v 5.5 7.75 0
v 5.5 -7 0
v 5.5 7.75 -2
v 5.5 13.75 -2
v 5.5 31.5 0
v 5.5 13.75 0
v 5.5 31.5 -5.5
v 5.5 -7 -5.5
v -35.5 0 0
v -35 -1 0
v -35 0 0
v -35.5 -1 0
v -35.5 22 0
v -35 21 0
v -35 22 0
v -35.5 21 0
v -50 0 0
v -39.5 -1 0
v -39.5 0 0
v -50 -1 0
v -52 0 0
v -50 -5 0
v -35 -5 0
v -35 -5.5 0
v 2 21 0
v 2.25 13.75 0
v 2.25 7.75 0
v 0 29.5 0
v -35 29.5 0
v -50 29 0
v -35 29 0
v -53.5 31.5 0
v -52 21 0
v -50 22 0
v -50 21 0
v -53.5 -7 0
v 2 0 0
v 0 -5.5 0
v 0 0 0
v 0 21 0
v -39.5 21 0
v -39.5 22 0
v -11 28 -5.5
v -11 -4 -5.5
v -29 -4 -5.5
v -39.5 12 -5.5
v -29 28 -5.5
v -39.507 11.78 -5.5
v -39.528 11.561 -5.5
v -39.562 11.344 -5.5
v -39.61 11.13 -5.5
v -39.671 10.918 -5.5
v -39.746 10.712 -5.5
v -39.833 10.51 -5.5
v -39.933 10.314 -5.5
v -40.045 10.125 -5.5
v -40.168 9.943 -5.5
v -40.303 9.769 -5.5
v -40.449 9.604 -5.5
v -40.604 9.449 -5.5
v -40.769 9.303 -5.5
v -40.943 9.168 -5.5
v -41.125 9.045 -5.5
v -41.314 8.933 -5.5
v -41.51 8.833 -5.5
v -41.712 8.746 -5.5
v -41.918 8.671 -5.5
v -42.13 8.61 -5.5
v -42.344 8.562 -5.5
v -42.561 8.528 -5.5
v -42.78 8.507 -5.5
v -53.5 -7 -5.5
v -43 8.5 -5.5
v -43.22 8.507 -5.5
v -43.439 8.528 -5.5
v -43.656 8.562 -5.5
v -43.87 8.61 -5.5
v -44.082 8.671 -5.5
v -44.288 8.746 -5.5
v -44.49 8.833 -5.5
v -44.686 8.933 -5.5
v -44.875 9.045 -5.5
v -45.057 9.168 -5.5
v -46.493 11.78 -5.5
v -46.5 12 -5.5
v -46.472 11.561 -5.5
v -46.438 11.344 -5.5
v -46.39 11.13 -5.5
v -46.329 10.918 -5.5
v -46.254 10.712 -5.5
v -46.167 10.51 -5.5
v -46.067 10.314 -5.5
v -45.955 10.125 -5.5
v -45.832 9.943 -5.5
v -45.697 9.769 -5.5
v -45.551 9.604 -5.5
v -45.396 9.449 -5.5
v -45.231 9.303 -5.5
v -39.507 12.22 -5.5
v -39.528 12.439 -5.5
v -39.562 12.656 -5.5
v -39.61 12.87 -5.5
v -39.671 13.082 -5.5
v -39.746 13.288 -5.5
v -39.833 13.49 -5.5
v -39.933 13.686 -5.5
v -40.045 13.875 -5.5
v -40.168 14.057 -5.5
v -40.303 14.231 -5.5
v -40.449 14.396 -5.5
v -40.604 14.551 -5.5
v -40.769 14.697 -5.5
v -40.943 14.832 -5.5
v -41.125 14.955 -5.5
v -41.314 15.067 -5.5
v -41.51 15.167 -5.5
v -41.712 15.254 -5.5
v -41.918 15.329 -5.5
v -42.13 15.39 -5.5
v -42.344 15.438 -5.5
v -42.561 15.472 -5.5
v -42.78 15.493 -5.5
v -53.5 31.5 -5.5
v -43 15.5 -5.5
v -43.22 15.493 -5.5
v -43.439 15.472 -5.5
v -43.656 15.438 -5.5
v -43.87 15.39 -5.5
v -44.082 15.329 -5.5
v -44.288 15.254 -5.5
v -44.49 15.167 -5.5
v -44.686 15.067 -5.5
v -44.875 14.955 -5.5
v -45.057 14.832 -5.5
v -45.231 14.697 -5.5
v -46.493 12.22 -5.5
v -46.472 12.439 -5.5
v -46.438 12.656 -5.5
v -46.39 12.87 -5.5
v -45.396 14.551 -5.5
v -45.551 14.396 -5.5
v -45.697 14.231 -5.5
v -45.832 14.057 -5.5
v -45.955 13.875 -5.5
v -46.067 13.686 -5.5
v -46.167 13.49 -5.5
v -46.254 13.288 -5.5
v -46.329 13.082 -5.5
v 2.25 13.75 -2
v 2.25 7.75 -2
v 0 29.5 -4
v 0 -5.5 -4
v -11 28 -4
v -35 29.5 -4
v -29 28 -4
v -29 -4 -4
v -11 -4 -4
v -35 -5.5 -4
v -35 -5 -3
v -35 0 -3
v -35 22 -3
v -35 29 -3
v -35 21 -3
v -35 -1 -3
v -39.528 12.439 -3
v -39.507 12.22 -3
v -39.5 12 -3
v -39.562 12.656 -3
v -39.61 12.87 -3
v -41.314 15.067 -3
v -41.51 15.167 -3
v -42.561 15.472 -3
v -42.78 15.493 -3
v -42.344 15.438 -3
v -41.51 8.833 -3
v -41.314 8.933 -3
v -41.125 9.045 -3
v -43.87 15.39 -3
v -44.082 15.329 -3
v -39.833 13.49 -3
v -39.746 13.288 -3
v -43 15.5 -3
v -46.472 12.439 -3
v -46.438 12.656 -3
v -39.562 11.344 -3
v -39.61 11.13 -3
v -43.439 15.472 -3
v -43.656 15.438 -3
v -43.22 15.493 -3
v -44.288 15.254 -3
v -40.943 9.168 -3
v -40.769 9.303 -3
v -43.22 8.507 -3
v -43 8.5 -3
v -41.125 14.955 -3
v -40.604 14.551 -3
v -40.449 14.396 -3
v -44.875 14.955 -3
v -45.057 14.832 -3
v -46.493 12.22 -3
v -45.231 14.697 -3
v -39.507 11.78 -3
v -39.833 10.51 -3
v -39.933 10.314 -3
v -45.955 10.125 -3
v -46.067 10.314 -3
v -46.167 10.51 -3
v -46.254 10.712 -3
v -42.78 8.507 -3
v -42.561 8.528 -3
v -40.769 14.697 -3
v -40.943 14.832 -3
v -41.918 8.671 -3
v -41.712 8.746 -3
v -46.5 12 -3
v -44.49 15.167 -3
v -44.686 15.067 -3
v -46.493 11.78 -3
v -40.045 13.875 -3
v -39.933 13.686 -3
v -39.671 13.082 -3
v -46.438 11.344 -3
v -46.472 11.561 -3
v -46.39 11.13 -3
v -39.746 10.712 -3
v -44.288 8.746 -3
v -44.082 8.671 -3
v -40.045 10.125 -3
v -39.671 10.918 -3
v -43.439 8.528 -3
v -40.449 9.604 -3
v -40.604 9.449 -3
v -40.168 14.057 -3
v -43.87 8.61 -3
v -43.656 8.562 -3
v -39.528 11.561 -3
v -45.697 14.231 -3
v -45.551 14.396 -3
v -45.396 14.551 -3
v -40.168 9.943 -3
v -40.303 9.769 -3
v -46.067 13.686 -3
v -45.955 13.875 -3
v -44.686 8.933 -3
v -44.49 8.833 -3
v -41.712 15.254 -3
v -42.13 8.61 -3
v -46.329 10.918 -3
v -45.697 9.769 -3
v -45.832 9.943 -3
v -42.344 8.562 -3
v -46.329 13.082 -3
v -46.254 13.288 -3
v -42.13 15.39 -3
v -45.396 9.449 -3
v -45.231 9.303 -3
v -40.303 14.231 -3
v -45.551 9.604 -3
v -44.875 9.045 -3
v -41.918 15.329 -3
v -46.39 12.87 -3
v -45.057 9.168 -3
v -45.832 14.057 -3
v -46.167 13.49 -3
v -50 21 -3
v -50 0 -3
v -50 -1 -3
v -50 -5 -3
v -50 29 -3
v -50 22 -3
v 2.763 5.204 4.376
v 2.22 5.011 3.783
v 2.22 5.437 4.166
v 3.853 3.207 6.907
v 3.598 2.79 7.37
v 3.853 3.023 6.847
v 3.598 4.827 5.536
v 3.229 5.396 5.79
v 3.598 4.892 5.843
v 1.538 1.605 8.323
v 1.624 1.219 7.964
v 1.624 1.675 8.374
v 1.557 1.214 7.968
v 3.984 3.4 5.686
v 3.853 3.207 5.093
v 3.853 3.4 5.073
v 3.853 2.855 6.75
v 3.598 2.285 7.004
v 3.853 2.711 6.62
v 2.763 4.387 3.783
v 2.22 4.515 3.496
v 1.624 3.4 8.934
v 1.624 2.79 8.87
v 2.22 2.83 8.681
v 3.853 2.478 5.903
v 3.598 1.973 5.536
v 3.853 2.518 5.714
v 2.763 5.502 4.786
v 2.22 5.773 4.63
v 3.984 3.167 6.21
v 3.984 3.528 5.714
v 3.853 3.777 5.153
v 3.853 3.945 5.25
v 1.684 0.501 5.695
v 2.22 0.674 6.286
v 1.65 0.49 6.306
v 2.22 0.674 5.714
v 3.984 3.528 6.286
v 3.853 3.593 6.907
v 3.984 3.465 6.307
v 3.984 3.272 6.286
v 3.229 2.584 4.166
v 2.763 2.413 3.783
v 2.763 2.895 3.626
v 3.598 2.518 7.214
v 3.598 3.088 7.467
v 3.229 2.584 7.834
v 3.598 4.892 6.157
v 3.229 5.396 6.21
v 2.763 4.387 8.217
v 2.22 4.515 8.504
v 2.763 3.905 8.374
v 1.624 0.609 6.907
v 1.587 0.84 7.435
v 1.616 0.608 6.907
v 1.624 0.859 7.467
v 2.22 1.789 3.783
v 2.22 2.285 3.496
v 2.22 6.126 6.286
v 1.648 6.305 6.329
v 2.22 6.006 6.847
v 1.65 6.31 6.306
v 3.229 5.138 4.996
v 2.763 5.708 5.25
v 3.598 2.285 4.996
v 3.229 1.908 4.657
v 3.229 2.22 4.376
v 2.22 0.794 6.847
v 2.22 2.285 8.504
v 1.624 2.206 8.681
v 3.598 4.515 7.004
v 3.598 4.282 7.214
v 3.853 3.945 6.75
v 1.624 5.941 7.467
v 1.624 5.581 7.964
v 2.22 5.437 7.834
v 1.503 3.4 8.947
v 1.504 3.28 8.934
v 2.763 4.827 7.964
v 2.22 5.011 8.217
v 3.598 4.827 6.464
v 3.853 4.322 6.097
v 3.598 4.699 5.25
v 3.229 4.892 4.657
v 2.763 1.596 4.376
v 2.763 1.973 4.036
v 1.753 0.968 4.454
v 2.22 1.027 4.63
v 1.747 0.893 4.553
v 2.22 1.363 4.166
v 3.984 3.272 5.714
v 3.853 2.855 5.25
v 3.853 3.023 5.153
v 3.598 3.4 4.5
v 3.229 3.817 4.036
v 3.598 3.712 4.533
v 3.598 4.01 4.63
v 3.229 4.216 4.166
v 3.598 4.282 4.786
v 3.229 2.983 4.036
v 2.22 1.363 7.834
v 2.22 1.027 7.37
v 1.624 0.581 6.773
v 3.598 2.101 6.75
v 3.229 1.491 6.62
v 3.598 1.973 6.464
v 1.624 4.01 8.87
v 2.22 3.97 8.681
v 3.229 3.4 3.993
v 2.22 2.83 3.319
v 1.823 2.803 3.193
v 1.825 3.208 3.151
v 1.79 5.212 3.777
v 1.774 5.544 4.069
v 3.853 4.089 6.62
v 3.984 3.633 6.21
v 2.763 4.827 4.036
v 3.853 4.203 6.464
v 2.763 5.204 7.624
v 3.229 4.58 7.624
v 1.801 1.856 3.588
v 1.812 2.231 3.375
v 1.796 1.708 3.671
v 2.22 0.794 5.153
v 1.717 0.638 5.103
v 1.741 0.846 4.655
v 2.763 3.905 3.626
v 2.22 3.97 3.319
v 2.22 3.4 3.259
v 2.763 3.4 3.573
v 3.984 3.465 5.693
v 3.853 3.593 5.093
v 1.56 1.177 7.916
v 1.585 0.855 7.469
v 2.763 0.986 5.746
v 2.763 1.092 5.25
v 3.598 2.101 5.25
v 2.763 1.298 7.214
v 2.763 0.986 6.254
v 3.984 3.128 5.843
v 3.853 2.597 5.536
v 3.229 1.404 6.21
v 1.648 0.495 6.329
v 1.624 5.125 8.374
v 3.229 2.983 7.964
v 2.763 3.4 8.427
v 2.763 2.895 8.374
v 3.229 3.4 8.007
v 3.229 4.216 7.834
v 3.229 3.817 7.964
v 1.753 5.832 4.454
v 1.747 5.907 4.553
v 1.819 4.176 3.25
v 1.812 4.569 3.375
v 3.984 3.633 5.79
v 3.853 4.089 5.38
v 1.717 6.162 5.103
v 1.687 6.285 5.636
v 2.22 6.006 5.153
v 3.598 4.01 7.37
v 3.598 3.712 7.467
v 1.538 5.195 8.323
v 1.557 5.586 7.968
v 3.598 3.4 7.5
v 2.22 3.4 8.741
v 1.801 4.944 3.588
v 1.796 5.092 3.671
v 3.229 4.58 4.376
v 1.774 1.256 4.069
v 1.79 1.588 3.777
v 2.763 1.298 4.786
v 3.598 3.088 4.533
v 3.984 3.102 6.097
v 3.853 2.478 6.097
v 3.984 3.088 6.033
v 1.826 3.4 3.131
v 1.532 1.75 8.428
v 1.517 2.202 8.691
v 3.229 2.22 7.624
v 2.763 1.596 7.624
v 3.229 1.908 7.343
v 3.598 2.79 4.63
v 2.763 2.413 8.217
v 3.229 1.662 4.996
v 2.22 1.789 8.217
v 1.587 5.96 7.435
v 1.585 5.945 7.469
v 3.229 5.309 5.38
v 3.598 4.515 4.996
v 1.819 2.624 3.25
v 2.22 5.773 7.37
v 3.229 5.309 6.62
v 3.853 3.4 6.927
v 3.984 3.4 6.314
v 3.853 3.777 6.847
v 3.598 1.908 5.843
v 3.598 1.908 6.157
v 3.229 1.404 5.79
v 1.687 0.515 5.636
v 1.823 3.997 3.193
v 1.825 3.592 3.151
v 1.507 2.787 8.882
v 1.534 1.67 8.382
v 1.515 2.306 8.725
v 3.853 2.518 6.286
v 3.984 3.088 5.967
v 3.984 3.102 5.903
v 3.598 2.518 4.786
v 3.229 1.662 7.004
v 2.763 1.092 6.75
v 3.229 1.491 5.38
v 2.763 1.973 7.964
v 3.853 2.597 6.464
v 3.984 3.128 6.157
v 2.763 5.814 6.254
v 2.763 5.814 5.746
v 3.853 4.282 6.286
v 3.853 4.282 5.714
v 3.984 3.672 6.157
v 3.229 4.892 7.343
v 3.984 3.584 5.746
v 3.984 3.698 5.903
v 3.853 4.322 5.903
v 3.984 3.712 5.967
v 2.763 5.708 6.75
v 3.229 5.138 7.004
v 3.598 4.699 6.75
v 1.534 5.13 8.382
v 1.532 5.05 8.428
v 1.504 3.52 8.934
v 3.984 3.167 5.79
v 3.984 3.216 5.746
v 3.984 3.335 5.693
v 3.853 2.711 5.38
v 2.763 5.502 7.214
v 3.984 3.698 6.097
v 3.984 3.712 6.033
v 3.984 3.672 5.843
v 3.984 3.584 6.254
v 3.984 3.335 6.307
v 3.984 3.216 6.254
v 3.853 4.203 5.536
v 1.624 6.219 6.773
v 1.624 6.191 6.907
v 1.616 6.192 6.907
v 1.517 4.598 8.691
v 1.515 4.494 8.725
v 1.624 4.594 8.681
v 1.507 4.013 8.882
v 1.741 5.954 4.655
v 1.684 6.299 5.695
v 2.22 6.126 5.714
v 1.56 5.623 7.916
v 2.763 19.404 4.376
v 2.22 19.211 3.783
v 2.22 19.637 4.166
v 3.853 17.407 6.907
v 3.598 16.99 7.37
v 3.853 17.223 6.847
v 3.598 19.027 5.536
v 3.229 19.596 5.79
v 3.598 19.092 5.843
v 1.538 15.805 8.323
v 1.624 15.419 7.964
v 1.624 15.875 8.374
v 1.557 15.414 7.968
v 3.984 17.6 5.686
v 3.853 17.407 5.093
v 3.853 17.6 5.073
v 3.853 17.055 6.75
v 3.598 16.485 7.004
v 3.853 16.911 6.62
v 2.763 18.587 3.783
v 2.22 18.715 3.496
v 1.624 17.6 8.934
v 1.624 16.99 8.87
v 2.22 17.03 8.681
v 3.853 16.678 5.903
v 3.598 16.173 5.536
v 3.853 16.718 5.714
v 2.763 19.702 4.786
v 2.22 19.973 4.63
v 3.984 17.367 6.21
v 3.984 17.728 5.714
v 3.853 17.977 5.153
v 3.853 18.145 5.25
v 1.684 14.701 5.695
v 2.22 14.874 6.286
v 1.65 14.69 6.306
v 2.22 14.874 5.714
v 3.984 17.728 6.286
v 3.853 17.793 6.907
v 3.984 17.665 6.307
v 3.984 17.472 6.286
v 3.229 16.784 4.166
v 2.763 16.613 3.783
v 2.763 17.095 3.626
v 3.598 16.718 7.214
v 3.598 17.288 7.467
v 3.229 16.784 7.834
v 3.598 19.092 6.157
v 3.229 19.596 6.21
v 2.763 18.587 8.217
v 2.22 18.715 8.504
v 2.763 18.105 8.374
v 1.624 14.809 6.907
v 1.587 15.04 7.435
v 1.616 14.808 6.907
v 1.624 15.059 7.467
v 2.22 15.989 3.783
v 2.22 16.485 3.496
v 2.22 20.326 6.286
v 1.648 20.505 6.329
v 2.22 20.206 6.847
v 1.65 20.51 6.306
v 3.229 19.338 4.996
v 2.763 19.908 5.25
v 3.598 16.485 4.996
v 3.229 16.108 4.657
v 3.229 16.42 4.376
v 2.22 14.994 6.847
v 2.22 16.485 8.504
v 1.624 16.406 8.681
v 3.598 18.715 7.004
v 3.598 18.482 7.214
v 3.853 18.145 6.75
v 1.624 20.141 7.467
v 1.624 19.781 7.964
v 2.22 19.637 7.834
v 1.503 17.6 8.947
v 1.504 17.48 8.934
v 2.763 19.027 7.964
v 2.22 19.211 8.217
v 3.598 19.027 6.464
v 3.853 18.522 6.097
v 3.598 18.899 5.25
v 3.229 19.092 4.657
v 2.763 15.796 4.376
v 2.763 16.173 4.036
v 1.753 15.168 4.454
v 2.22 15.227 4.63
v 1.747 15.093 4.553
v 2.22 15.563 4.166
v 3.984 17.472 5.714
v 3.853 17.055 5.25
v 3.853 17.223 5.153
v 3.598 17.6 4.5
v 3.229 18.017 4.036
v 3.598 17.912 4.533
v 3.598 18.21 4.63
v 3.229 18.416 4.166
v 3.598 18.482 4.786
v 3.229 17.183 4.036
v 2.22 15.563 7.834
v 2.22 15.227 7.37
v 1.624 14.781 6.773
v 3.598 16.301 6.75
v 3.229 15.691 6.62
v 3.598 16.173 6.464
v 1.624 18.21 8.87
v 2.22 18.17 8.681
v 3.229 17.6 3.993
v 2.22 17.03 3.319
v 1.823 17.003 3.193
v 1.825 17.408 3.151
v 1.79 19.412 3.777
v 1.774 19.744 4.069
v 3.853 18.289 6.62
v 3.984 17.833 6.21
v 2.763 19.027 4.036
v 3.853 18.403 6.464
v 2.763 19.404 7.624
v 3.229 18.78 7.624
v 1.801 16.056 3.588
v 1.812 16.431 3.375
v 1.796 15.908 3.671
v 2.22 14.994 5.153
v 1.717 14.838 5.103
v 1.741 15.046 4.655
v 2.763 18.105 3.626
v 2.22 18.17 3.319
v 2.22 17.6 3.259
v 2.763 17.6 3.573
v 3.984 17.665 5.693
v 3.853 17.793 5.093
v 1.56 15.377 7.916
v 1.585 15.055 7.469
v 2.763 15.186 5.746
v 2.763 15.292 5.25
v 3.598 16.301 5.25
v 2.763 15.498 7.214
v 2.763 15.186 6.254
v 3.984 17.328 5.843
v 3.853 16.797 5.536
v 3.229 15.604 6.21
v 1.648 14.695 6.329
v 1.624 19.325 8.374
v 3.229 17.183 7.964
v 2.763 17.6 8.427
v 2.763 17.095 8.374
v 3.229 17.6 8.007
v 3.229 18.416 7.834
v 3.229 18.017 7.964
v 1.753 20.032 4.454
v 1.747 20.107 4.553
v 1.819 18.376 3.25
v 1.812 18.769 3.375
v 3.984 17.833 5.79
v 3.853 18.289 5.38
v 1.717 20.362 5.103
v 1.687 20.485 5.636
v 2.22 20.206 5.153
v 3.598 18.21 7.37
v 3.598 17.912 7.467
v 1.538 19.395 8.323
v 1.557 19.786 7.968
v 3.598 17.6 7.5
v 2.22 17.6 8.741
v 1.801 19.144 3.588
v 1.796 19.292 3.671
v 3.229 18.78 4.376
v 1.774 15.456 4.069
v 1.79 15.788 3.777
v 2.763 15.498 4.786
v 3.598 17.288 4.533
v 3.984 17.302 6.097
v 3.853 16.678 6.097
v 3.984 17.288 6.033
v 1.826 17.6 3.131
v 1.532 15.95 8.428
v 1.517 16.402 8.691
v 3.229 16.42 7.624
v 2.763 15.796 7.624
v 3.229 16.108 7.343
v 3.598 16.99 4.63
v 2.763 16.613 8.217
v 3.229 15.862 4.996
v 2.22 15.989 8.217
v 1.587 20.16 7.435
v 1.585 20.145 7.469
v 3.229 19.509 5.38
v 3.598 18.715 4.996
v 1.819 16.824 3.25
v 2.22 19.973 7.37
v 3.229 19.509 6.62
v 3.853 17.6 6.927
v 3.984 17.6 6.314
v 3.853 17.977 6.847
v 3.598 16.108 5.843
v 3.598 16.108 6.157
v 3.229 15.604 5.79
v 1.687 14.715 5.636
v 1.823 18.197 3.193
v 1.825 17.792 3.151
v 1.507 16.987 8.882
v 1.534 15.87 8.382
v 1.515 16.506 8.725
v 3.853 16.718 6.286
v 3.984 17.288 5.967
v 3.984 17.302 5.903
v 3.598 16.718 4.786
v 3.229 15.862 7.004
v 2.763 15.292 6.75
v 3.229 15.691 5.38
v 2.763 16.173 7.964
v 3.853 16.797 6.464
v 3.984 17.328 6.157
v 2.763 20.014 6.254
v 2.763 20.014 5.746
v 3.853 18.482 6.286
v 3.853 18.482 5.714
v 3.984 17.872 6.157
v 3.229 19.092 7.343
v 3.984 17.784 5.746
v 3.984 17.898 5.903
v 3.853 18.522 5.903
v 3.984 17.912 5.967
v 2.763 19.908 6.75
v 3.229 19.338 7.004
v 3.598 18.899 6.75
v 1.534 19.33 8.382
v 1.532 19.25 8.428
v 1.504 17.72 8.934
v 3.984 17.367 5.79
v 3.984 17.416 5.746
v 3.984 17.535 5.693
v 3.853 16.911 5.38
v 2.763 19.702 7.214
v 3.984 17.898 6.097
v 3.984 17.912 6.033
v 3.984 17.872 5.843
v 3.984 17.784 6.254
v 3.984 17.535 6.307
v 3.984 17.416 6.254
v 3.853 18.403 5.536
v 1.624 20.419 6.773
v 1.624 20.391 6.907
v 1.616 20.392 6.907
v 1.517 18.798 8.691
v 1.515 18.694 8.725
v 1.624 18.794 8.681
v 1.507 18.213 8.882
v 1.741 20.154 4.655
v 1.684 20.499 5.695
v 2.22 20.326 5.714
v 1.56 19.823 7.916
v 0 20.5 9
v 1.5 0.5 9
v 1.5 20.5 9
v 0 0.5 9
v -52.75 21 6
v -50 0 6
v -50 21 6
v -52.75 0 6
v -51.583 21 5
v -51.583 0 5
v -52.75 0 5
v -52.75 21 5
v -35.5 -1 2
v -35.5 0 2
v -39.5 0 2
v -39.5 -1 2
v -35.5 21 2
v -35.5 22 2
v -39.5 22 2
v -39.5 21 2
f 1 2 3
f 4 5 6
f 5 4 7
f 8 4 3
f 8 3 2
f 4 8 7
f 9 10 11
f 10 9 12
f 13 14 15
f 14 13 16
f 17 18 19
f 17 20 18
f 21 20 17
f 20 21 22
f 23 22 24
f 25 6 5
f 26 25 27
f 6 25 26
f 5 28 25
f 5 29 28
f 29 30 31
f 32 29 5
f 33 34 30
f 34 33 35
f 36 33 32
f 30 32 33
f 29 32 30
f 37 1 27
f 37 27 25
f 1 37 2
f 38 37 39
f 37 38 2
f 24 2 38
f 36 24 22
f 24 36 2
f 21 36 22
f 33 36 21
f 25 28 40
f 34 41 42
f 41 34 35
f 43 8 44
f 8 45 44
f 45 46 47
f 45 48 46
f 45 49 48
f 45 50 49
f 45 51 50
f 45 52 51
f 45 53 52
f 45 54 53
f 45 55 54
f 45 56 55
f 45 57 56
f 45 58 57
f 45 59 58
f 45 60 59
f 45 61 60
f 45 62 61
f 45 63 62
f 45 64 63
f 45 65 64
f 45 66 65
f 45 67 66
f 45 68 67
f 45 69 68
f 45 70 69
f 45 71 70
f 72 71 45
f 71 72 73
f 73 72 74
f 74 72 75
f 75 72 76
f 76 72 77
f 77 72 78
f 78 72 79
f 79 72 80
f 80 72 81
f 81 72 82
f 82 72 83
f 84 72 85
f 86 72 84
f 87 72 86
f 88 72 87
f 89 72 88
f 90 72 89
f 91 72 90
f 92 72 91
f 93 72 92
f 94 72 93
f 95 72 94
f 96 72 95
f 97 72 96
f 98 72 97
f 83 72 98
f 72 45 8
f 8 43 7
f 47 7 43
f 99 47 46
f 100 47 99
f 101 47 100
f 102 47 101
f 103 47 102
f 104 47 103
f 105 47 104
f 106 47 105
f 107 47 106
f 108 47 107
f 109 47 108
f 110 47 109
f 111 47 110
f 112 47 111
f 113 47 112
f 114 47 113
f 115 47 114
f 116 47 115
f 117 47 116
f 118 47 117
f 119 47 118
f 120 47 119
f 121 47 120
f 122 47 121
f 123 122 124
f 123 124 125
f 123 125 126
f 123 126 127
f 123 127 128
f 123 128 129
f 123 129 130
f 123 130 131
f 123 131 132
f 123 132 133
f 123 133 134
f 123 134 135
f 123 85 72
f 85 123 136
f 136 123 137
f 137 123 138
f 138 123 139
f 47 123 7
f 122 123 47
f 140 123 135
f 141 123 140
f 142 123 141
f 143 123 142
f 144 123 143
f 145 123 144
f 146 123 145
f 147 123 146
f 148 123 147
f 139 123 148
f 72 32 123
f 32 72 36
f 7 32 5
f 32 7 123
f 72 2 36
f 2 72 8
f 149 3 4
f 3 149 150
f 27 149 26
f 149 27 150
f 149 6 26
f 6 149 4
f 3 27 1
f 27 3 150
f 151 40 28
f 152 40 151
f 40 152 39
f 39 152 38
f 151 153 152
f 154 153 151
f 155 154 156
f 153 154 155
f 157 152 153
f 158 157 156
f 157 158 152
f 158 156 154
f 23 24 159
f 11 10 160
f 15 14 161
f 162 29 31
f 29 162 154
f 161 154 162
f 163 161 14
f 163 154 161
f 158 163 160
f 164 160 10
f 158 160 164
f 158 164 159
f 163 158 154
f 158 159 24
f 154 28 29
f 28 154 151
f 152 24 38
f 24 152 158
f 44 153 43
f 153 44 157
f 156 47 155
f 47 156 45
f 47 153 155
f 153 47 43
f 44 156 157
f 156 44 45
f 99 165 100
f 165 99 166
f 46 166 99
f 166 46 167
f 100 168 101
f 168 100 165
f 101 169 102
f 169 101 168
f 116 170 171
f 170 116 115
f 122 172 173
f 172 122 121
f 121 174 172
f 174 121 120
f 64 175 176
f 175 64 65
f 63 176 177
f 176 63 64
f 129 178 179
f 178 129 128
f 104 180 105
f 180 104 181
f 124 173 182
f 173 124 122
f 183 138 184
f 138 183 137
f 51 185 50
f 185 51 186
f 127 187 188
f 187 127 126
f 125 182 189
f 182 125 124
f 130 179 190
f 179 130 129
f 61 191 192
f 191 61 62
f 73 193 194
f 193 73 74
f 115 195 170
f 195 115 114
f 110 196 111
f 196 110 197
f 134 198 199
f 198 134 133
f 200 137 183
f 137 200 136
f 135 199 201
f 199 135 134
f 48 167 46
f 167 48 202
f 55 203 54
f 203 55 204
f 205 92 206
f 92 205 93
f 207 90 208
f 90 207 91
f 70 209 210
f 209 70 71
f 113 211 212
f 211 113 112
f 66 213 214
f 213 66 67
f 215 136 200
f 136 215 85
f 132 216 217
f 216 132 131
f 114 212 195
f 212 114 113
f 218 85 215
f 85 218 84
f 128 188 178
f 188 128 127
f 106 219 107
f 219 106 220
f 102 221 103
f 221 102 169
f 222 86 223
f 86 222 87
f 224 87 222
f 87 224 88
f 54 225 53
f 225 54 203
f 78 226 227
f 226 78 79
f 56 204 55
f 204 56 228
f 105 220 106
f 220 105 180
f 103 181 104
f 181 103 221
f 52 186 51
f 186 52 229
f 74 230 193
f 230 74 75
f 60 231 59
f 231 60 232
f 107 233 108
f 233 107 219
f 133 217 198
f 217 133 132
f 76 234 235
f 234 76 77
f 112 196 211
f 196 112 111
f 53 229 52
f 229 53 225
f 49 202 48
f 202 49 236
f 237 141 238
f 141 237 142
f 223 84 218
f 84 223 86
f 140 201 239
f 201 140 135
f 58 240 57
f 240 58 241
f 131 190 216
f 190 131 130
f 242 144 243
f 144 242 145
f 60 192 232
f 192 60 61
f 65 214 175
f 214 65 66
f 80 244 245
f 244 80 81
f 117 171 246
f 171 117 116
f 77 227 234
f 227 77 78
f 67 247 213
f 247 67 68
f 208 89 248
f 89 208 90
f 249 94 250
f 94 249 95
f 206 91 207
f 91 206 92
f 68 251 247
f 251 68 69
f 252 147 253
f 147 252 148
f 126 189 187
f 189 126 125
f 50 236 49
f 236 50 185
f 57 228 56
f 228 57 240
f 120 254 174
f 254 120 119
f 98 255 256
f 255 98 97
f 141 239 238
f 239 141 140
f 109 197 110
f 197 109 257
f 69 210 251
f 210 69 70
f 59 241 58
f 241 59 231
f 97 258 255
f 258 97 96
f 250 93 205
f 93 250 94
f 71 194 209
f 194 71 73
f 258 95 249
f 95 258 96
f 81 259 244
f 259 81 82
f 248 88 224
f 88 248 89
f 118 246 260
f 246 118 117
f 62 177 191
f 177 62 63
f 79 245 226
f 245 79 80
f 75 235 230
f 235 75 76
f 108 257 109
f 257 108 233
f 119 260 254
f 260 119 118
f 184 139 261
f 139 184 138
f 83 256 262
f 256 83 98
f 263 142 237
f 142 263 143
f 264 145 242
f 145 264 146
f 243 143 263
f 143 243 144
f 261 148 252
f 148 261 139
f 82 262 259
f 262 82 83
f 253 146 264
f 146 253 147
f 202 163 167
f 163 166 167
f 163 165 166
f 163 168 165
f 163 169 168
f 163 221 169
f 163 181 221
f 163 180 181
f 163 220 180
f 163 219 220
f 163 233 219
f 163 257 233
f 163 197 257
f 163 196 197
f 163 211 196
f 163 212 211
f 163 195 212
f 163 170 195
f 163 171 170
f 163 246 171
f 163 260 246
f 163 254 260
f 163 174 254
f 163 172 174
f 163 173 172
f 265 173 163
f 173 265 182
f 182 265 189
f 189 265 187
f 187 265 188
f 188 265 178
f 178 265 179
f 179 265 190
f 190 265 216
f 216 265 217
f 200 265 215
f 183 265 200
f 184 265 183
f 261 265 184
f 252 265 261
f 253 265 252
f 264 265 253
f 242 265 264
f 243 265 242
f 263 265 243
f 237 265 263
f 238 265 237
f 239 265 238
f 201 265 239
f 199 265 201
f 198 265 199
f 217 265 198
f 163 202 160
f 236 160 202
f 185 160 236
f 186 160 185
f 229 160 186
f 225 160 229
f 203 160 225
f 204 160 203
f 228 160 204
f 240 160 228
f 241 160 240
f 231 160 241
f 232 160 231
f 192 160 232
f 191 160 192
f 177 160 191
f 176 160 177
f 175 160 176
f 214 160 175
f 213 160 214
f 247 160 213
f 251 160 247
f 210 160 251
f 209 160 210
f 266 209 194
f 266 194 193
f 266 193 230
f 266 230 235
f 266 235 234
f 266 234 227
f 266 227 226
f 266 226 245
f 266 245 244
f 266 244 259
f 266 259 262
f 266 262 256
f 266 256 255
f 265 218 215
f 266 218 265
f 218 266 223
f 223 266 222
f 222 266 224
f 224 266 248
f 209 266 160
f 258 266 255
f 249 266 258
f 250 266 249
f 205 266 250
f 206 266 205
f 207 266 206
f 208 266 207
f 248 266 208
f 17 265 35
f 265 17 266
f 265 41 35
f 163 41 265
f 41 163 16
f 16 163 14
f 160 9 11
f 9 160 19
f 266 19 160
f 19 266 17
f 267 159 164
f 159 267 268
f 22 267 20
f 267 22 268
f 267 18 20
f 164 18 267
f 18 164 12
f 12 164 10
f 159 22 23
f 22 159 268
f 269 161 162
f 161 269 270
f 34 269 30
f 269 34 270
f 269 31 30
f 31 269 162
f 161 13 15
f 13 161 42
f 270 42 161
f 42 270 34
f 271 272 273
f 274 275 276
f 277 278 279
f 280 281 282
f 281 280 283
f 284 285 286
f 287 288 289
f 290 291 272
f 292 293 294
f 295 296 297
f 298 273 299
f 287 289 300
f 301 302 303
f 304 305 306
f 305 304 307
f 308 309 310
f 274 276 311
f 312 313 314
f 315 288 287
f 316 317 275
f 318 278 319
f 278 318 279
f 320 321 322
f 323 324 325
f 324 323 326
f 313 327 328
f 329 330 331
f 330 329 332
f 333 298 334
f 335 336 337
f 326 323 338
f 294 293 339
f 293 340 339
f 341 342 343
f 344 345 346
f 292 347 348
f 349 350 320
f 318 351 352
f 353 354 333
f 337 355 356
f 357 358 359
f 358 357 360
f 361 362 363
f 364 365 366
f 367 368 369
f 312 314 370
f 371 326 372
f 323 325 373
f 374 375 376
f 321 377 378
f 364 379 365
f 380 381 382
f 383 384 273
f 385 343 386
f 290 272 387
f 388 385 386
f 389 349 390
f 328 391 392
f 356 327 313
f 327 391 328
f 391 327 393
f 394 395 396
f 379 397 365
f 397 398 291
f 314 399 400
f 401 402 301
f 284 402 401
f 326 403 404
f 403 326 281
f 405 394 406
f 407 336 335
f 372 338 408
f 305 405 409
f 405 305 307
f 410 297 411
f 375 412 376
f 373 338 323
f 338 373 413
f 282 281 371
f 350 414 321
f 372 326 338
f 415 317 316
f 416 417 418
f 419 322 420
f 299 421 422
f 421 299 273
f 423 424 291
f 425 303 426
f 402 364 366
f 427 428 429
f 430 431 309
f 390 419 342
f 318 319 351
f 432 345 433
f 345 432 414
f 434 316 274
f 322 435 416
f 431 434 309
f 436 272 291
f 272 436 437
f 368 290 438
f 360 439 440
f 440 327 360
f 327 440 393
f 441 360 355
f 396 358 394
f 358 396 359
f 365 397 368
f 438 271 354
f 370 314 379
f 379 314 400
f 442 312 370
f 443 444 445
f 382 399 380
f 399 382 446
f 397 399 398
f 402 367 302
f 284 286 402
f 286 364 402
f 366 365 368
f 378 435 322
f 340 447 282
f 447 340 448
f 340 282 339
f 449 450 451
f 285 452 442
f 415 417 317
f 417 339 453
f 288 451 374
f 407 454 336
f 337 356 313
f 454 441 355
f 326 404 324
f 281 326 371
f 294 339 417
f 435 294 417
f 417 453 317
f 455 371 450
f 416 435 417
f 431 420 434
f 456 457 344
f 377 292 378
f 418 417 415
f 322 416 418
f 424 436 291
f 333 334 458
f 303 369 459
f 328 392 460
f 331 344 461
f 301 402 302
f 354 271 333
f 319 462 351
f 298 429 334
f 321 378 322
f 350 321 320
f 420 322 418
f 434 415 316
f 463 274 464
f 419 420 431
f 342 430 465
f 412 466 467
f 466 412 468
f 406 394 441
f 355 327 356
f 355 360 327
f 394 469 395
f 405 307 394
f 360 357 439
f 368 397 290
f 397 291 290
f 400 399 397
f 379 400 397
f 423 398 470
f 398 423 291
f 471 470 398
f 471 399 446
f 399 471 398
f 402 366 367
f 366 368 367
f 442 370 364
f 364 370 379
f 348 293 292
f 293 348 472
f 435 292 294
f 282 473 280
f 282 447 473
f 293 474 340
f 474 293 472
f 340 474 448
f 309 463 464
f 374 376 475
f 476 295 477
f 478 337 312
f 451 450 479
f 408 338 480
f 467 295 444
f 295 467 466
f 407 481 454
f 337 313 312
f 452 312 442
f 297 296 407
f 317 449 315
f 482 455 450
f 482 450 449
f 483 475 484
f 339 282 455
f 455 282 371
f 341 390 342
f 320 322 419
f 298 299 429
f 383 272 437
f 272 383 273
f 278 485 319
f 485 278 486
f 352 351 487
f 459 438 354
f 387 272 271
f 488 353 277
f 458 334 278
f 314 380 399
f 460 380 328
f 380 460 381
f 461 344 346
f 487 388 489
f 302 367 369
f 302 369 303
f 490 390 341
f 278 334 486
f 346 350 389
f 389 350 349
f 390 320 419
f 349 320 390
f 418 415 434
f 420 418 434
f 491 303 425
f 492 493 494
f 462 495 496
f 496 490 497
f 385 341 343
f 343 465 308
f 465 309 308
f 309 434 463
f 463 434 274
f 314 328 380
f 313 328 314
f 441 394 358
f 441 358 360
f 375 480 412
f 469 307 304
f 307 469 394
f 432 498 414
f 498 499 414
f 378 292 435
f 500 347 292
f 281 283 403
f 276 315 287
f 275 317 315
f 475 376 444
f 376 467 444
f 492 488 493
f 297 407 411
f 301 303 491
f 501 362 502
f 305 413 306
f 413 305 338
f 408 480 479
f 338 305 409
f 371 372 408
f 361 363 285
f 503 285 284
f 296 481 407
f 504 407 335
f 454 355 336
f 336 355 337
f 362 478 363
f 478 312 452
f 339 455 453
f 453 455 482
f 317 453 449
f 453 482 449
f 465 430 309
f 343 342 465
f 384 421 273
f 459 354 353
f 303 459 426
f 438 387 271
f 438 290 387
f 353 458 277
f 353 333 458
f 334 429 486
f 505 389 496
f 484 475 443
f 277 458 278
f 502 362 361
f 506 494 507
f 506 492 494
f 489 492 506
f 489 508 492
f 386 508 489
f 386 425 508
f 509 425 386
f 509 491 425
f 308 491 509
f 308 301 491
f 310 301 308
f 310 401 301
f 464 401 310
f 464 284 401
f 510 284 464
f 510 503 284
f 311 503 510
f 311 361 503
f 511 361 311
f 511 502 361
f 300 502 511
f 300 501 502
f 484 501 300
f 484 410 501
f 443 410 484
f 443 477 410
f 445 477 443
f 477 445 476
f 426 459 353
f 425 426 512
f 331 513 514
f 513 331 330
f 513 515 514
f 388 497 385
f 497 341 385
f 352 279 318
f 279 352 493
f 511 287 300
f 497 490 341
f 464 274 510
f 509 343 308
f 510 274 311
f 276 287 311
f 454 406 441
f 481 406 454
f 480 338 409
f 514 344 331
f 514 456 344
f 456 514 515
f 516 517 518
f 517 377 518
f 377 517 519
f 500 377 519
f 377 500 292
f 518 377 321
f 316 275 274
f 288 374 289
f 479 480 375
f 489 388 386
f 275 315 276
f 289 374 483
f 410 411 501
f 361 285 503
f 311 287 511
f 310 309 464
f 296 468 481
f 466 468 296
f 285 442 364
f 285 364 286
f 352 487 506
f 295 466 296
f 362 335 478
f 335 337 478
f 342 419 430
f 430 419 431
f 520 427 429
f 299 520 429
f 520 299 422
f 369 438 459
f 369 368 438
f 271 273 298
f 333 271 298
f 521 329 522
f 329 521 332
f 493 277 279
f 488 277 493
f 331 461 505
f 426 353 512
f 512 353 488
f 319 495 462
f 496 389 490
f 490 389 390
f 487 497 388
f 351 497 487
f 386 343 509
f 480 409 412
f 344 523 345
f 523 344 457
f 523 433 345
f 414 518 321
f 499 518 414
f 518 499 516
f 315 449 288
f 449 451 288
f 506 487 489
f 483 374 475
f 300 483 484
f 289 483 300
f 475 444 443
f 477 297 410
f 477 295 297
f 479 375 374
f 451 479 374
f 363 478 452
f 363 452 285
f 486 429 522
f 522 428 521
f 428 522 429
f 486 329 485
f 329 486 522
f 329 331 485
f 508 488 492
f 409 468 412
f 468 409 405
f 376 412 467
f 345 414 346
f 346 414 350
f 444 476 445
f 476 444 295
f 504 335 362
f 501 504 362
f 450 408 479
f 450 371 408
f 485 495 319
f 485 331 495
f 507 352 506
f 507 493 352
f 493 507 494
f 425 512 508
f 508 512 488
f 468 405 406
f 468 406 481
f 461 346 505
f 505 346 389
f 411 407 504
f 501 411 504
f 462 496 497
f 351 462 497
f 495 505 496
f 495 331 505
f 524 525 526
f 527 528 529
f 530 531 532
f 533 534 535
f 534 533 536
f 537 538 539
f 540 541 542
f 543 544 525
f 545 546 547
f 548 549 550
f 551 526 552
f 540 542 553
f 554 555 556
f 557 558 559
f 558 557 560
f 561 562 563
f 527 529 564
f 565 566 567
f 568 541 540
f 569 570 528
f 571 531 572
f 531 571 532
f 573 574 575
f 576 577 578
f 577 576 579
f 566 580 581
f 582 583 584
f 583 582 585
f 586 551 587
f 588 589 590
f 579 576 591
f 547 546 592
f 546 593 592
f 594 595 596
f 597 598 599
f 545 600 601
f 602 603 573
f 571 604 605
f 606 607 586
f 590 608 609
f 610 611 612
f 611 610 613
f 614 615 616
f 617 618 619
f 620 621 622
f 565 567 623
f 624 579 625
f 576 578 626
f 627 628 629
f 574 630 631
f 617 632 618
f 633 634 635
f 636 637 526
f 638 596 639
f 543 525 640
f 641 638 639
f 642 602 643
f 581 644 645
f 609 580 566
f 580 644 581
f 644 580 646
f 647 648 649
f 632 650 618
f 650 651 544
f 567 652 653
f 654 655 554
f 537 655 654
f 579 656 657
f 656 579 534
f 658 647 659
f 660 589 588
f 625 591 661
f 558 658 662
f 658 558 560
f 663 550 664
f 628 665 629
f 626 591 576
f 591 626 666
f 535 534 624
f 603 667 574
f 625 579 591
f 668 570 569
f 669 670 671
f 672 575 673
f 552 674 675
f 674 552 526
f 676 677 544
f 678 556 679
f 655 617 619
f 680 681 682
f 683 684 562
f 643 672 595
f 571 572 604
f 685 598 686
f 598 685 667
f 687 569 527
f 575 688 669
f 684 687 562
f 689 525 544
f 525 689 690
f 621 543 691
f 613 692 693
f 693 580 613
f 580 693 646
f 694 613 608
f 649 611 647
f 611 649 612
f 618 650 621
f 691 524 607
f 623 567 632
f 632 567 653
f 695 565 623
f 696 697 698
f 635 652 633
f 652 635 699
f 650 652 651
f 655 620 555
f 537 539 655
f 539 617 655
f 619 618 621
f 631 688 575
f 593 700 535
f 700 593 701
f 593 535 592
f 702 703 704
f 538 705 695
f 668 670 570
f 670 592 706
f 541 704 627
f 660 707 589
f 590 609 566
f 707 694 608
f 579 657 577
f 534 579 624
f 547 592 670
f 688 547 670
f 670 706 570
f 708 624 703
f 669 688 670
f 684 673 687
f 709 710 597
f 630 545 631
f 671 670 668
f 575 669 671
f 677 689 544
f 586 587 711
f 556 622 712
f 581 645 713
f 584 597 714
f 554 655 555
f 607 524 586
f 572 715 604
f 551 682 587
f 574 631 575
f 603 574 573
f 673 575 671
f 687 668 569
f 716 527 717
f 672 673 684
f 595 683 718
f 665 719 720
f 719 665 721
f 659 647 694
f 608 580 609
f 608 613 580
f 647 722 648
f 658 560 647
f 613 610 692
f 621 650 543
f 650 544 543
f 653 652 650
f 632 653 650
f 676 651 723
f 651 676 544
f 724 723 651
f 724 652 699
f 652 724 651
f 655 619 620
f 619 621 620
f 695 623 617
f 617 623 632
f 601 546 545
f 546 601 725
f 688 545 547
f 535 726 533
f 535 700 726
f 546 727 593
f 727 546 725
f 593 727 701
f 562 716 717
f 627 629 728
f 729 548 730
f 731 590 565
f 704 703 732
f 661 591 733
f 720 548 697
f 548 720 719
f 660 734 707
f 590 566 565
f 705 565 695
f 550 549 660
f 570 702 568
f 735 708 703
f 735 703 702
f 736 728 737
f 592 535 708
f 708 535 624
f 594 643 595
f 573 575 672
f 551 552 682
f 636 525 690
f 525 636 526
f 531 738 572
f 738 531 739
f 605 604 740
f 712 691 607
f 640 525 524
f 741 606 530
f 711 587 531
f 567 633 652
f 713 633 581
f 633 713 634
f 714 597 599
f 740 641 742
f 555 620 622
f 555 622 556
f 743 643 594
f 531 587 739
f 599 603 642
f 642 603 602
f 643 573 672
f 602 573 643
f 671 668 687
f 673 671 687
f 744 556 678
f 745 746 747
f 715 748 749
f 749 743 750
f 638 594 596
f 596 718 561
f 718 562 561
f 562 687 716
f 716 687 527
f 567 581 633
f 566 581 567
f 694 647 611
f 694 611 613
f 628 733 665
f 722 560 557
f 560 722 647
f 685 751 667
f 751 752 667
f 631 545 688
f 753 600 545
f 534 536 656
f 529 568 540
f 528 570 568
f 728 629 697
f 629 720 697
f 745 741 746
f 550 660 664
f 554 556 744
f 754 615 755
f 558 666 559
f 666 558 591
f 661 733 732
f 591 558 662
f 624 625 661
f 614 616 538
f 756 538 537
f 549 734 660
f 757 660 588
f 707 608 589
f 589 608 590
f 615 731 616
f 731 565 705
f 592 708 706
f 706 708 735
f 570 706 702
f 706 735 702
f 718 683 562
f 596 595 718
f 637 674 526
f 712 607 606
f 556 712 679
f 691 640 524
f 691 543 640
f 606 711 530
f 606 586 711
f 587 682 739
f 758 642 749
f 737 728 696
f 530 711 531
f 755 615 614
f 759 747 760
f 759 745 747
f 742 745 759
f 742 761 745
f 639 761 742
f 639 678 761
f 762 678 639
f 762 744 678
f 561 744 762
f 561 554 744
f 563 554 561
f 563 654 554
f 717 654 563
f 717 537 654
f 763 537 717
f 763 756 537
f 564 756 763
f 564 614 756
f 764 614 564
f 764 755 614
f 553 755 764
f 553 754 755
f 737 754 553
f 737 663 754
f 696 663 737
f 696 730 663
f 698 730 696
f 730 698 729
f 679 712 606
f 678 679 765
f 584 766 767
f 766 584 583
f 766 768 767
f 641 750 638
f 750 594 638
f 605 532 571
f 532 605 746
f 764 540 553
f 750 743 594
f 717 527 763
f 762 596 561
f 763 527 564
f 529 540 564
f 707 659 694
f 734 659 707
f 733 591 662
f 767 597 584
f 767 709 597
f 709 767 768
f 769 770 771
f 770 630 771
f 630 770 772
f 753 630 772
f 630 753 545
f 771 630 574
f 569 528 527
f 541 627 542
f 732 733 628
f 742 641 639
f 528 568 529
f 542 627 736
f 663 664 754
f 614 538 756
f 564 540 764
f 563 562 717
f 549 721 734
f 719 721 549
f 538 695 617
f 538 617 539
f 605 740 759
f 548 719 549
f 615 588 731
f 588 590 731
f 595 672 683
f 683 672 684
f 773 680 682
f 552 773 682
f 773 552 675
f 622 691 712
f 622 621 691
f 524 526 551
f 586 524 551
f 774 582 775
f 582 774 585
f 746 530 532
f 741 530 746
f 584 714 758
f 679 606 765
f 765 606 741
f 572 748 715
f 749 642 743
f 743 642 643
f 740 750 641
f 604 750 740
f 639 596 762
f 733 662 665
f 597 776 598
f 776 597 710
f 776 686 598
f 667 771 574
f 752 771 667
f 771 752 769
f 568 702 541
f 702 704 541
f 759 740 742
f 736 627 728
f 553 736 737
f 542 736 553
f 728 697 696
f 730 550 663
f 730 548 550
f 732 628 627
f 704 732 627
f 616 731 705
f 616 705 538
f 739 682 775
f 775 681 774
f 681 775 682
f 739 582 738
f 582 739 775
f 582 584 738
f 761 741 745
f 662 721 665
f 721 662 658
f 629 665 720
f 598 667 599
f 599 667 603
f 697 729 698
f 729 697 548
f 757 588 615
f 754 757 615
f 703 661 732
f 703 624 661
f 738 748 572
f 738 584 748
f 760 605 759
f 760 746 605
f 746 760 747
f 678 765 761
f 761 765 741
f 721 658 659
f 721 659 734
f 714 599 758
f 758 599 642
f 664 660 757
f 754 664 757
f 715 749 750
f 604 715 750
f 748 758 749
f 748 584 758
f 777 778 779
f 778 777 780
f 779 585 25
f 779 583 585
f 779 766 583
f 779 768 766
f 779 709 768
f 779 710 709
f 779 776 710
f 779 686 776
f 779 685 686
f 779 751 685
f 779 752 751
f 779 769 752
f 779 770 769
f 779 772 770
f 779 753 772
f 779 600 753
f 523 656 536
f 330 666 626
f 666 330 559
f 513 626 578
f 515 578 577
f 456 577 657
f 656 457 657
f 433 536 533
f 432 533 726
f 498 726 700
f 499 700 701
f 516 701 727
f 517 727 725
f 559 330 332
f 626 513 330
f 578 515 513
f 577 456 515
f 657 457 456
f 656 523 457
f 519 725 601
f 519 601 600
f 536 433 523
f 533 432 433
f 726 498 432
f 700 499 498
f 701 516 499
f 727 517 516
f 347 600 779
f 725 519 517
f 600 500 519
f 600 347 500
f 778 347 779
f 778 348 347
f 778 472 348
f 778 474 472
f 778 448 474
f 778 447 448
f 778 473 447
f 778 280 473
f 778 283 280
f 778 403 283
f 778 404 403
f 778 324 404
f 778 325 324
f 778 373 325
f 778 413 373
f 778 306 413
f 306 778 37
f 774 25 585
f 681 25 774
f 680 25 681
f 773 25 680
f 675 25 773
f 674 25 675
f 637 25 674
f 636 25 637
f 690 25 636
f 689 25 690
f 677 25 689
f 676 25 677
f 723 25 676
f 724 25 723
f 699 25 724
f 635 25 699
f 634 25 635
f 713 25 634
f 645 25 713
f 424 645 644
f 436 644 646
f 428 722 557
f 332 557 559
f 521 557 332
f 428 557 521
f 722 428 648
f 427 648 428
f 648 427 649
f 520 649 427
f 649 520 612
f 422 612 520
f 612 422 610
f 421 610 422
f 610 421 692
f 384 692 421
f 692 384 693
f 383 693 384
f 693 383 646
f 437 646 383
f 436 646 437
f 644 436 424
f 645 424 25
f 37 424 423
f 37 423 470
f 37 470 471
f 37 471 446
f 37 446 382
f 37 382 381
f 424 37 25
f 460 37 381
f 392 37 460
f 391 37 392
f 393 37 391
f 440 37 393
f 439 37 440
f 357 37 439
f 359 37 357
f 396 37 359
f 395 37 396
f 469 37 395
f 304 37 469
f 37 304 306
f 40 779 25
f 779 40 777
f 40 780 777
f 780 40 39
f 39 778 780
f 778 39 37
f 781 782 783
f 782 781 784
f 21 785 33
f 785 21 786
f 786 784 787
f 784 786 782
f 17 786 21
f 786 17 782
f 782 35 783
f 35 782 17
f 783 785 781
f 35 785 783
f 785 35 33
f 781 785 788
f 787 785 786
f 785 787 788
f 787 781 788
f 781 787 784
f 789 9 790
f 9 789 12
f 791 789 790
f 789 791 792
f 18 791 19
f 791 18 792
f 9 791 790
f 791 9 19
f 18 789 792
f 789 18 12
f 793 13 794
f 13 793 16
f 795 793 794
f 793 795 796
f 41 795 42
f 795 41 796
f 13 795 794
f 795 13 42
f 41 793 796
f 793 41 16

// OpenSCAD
// BBC B 'Ashtray' cover per original Acorn design
facets=30;

// Top

difference(){
    translate([-53.5,-7,-5.5]) 
        cube([59,38.5,5.5]);
    translate([2.25,7.75,-2])
        cube ([5.6,6,2.1]);
    // OLED Screen
    translate([-35,-5.5,-4])
        cube ([35,35,4.1]);
    translate([-29,-4,-6])
        cube ([18,32,7]);
    // Rotory Encoder
    translate([-43,12,-6])
        cylinder(r=3.5,h=7,$fn=100);
    translate([-50,0,-3])
        cube ([18,21,3.1]);
    translate([-50,-5,-3])
        cube ([18,4,3.1]);
    translate([-50,22,-3])
        cube ([18,7,3.1]);
    //translate([-43,12,-6])
    //    cylinder(r=7,h=4,$fn=6);
    //translate([-43,12,-6])
    //    cylinder(r=9,h=2,$fn=100);
    };
// Lower Clip

hull() {
    polyhedron
            ( points=[
                [0,0,0], [0,21,0], [0,20.5,9],[0,0.5,9],
                [1.5,0.5,9],[1.5,20.5,9],[2,21,0],[2,0,0]  ],
          faces=[
                [0,1,2,3],[4,5,6,7],[0,1,6,7],
                [2,3,4,5],[0,3,4,7],[1,2,5,6]   ]
            );

};
    translate([1,3.4,6]) rotate([0,90,0]) difference() {
        sphere(r=3, $fn=facets);
        translate([-5,-5,-5]) 
            cube ([10,10,5]);
    };    

    translate([1,17.6,6]) rotate([0,90,0]) difference() {
        sphere(r=3, $fn=facets);
        translate([-5,-5,-5]) 
            cube ([10,10,5]);
    }; 
    
// Upper Clip

translate([-52,0,0]) 
    hull() {
        polyhedron
                ( points=[
                    [0,0,0], [0,21,0], [0.5,21,6],[0.5,0,6],
                    [2,0,6],[2,21,6],[2,21,0],[2,0,0]  ],
              faces=[
                    [0,1,2,3],[4,5,6,7],[0,1,6,7],
                    [2,3,4,5],[0,3,4,7],[1,2,5,6]   ]
                );
    };
translate([-52.75,0,5])
    cube([2,21,1]);

// Side Guides
translate([-39.5,-1,0])
    cube([4,1,2]);
    
translate([-39.5,21,0])
    cube([4,1,2]);
